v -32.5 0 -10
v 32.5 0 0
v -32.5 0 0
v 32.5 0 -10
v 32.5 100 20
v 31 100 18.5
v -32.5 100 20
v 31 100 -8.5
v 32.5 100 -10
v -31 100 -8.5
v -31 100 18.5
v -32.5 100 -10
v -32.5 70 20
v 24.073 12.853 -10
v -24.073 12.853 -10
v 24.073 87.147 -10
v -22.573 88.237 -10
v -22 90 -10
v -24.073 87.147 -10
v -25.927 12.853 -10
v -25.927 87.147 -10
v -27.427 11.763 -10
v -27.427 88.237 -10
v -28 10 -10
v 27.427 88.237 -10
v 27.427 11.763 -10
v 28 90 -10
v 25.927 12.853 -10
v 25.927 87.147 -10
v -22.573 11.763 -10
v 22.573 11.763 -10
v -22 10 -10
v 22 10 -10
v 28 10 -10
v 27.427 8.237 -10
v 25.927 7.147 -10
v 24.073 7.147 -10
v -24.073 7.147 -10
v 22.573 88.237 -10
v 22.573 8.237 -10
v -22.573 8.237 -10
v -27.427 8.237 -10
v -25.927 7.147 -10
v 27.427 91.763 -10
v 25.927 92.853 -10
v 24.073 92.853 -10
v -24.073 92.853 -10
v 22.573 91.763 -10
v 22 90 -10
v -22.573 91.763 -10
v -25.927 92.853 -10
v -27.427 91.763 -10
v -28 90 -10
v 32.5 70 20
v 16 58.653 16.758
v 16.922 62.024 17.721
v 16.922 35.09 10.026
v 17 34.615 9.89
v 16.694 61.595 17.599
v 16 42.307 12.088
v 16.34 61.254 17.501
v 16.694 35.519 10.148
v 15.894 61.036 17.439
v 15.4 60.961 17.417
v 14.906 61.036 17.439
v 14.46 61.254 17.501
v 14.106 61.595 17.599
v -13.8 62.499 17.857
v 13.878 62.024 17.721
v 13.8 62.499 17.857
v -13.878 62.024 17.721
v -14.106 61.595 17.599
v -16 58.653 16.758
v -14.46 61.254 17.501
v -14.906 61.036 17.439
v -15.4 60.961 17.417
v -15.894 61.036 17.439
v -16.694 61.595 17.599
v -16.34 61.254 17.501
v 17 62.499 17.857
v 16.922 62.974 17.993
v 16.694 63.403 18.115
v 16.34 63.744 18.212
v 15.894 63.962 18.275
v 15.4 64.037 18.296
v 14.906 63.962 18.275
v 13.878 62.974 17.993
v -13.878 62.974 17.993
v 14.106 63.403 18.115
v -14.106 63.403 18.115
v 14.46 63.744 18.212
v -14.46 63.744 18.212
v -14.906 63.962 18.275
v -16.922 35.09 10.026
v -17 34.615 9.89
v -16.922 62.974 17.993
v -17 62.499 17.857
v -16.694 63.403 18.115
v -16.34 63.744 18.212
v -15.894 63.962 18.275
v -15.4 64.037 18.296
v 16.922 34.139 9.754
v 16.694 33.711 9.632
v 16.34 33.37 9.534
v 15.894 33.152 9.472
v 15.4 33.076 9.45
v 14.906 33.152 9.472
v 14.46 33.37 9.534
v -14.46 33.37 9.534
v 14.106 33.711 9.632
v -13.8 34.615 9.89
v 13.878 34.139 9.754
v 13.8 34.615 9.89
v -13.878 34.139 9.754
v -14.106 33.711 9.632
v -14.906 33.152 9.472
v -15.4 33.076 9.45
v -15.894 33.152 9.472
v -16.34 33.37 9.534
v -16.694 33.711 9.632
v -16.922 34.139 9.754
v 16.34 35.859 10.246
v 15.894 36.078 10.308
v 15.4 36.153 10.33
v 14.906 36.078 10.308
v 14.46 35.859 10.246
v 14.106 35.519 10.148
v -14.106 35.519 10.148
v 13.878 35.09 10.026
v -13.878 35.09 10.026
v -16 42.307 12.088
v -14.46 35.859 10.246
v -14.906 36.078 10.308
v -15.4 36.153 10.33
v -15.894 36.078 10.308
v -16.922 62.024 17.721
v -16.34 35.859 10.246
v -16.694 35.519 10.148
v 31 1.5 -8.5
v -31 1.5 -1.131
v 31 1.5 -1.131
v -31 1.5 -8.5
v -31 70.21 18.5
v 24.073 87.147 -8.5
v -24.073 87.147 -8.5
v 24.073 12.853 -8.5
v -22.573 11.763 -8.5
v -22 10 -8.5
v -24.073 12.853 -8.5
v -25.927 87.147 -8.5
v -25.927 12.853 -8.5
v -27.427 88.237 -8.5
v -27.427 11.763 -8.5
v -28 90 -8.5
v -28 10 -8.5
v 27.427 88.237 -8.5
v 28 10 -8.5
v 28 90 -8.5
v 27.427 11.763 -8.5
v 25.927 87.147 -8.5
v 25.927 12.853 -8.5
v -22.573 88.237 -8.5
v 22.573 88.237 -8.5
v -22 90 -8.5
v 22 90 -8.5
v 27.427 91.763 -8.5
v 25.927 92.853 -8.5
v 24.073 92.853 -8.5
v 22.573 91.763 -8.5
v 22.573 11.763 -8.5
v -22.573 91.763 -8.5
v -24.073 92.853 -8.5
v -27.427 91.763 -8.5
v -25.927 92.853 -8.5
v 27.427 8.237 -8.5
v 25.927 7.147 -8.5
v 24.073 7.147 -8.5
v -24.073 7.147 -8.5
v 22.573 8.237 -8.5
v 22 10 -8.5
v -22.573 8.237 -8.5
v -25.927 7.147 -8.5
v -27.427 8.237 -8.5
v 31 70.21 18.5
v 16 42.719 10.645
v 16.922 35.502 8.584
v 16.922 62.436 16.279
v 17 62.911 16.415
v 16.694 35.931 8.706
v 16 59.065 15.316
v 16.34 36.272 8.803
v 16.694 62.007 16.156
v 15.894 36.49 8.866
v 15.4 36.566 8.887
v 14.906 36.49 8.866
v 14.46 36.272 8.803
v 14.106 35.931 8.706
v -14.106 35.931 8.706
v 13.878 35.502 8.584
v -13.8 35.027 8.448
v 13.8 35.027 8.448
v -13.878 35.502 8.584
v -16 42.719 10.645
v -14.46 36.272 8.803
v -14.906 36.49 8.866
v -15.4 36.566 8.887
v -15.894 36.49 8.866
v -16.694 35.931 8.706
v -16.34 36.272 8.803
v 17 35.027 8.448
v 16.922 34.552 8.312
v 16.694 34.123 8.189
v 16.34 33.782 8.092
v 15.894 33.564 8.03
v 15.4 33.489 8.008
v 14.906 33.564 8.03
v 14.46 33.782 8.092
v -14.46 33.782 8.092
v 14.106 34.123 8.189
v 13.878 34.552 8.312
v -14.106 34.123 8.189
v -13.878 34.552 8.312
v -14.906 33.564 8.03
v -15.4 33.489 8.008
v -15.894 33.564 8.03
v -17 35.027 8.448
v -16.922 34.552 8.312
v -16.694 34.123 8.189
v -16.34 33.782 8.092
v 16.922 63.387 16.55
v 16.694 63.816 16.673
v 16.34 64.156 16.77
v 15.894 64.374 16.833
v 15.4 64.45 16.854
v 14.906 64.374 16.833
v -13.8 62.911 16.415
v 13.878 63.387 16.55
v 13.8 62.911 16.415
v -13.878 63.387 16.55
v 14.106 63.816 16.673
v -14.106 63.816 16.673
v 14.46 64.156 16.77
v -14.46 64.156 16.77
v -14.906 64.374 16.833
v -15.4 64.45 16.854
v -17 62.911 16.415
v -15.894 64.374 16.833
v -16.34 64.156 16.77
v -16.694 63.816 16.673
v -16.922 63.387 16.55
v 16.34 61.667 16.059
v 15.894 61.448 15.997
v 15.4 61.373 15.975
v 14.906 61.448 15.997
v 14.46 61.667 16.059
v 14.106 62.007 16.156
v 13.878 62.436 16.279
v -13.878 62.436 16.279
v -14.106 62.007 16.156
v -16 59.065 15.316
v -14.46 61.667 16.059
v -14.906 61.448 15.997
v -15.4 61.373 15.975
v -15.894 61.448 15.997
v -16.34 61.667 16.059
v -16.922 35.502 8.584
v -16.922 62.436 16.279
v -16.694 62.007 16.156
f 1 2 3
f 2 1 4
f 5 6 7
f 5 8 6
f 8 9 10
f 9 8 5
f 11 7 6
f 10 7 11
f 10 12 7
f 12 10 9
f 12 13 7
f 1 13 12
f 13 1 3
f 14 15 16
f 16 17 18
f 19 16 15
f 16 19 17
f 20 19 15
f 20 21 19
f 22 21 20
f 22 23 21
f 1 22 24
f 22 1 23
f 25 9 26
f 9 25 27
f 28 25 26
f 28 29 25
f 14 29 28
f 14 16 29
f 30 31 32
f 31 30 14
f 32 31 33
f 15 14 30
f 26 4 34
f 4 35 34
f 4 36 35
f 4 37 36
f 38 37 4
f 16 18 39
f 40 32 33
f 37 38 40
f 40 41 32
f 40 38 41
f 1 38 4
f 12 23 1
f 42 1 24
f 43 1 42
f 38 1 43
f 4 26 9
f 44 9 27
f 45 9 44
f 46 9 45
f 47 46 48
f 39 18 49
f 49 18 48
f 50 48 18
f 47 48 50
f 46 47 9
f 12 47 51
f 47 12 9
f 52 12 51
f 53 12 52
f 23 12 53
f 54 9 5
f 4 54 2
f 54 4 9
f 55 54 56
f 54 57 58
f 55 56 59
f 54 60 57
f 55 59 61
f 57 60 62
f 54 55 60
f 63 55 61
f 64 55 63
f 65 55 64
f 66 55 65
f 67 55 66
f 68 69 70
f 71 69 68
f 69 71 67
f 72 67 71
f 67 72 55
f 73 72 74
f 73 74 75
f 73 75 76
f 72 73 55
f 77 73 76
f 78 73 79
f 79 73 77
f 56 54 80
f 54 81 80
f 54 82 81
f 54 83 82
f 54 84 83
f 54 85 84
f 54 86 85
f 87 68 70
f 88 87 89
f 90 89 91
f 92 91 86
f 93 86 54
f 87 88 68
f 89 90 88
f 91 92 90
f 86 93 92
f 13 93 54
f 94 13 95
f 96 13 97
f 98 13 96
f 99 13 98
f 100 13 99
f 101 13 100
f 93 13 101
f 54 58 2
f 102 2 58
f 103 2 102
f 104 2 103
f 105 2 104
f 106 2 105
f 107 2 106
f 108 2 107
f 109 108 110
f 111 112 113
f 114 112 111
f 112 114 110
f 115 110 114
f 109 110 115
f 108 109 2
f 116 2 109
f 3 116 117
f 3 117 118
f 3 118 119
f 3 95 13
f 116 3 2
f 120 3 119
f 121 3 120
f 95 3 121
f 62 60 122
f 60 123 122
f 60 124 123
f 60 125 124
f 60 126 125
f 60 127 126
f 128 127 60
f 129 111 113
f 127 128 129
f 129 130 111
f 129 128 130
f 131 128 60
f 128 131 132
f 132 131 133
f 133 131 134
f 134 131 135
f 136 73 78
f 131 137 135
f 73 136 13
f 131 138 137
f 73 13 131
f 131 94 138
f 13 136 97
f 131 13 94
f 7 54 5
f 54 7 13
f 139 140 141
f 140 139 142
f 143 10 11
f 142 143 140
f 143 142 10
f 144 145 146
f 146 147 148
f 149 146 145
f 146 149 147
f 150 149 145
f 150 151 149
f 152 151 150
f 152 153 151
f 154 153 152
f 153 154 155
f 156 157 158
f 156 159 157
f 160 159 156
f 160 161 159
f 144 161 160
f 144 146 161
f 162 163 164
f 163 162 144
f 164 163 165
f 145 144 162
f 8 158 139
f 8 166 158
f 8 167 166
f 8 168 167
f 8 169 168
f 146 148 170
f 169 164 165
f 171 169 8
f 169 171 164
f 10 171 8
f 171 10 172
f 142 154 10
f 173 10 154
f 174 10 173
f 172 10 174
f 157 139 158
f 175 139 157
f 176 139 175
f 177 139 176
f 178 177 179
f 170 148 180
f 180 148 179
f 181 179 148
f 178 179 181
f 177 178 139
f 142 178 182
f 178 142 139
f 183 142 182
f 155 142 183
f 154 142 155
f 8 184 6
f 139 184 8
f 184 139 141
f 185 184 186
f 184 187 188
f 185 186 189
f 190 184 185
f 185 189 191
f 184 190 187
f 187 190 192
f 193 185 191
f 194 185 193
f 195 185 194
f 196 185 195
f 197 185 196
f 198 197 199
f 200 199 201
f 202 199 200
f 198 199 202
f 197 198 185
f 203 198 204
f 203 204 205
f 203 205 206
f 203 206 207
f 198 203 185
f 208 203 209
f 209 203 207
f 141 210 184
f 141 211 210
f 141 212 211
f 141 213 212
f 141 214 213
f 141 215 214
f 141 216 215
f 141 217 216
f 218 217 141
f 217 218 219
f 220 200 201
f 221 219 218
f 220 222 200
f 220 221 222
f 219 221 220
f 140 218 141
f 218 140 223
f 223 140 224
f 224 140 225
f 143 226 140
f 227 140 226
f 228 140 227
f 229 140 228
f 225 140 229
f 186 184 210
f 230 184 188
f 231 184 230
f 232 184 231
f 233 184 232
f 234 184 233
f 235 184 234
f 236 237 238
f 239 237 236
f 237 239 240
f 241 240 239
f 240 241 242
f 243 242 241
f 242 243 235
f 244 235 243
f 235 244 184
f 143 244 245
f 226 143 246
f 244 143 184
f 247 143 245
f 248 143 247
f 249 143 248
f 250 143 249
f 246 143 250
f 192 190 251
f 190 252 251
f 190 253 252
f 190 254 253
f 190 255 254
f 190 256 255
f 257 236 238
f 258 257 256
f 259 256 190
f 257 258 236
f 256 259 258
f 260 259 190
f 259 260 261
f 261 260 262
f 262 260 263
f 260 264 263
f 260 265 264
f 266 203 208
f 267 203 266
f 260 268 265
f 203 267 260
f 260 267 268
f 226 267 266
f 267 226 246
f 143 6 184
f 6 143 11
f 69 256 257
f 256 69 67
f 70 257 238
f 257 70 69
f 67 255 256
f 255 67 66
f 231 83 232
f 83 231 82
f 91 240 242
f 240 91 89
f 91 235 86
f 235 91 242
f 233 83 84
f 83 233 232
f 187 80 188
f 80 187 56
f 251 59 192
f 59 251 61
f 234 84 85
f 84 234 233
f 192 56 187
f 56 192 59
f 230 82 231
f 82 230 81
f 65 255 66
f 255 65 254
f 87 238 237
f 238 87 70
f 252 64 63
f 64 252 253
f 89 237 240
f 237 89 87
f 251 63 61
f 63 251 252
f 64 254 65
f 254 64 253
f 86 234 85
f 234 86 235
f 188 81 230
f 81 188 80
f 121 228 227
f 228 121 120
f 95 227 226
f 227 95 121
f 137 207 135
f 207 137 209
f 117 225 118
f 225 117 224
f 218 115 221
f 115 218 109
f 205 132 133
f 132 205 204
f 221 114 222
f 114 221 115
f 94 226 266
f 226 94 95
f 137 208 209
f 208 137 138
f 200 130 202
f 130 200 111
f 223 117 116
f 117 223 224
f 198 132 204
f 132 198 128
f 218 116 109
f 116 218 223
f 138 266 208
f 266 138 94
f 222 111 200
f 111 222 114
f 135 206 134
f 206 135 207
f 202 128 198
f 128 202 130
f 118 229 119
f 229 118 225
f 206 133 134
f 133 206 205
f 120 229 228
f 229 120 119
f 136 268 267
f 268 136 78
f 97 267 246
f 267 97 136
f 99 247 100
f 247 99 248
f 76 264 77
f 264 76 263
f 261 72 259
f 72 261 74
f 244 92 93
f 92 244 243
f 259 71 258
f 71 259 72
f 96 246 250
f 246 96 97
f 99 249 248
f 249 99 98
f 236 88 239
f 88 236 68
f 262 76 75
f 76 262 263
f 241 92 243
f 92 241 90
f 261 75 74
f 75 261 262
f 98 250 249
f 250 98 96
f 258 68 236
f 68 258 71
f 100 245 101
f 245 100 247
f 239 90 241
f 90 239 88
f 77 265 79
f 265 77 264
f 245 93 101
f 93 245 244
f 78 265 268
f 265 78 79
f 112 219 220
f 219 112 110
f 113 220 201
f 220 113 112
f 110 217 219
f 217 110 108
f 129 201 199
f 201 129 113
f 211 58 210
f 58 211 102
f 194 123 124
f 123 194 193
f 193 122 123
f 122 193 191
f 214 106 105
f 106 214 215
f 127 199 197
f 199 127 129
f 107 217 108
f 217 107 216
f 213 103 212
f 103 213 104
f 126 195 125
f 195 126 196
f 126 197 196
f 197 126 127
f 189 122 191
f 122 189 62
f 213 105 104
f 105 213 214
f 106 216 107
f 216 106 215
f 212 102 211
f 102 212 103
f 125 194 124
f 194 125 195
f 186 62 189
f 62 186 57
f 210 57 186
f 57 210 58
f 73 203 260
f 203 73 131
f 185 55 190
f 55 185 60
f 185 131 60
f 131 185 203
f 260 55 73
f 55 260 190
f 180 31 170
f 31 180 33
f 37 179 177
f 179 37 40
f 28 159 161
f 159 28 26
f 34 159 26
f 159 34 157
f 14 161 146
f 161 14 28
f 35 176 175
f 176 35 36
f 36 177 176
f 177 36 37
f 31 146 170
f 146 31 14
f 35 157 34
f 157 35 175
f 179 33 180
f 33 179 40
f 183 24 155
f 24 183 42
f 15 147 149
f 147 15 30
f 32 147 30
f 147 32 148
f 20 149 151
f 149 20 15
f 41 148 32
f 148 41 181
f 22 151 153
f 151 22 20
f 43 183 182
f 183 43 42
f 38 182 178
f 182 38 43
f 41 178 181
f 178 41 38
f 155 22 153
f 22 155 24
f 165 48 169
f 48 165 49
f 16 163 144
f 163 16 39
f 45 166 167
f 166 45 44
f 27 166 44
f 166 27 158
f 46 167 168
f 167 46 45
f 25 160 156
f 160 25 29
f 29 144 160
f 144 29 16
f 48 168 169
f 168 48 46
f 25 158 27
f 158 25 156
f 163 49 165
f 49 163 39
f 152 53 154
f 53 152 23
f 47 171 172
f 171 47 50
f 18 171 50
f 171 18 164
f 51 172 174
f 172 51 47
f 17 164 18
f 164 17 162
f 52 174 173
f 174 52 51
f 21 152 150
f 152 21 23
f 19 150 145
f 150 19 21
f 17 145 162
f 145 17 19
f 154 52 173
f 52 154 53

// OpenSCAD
difference() {
    pedal_box();
    rotate([15.95,0,0]) translate([0,65,0]) #oled();
    #bottom_holes();
}


module pedal_box() {
    // Shell: outer profile minus inner cavity (1.5mm walls), open at x=100 face
    H = 65;
    T = 1.5;

    translate([-H/2,0,0]) rotate([90,0,90])
    difference() {
        linear_extrude(height = H)
            polygon(points = [[0, 0], [0, -10], [100, -10], [100, 20], [70, 20]]);

        // cavity = outer profile offset inward by 1.5, extended past x=100 to open that face
        // hypotenuse (0,0)-(70,20) offset: 2x - 7y = 1.5*sqrt(53) ≈ 10.920
        translate([0,0,T]) linear_extrude(height = H-T*2)
            polygon(points = [
                [1.5, -1.1315],   // offset hypotenuse x offset x=1.5
                [1.5, -8.5],      // offset hypotenuse-> no: corner x=1.5 & y=-8.5
                [101.5, -8.5],    // past x=100 -> opens the face
                [101.5, 18.5],
                [70.2101, 18.5]   // offset hypotenuse x offset y=18.5
            ]);
    }
}


module oled() {
    hw=33.8-3;
    hh=32-3;
    
    rotate([0,0,180]) {
        translate([-hw/2,0,0]) union() {
            cylinder(h=20, r=3.2/2, center=true, $fn=20);
            translate([hw, hh, 0]) cylinder(h=20, r=3.2/2, center=true, $fn=20);
            translate([hw, 0, 0]) cylinder(h=20, r=3.2/2, center=true, $fn=20);
            translate([0, hh, 0]) cylinder(h=20, r=3.2/2, center=true, $fn=20);
        }
        translate([-32/2,4,-10]) cube([32,17,20]);
    }
}

module bottom_holes() {
    // w=50, h=80
    translate([25,10,-15]) cylinder(10, 3, 3);
    translate([-25,10,-15]) cylinder(10, 3, 3);
    translate([25,90,-15]) cylinder(10, 3, 3);
    translate([-25,90,-15]) cylinder(10, 3, 3);
}
